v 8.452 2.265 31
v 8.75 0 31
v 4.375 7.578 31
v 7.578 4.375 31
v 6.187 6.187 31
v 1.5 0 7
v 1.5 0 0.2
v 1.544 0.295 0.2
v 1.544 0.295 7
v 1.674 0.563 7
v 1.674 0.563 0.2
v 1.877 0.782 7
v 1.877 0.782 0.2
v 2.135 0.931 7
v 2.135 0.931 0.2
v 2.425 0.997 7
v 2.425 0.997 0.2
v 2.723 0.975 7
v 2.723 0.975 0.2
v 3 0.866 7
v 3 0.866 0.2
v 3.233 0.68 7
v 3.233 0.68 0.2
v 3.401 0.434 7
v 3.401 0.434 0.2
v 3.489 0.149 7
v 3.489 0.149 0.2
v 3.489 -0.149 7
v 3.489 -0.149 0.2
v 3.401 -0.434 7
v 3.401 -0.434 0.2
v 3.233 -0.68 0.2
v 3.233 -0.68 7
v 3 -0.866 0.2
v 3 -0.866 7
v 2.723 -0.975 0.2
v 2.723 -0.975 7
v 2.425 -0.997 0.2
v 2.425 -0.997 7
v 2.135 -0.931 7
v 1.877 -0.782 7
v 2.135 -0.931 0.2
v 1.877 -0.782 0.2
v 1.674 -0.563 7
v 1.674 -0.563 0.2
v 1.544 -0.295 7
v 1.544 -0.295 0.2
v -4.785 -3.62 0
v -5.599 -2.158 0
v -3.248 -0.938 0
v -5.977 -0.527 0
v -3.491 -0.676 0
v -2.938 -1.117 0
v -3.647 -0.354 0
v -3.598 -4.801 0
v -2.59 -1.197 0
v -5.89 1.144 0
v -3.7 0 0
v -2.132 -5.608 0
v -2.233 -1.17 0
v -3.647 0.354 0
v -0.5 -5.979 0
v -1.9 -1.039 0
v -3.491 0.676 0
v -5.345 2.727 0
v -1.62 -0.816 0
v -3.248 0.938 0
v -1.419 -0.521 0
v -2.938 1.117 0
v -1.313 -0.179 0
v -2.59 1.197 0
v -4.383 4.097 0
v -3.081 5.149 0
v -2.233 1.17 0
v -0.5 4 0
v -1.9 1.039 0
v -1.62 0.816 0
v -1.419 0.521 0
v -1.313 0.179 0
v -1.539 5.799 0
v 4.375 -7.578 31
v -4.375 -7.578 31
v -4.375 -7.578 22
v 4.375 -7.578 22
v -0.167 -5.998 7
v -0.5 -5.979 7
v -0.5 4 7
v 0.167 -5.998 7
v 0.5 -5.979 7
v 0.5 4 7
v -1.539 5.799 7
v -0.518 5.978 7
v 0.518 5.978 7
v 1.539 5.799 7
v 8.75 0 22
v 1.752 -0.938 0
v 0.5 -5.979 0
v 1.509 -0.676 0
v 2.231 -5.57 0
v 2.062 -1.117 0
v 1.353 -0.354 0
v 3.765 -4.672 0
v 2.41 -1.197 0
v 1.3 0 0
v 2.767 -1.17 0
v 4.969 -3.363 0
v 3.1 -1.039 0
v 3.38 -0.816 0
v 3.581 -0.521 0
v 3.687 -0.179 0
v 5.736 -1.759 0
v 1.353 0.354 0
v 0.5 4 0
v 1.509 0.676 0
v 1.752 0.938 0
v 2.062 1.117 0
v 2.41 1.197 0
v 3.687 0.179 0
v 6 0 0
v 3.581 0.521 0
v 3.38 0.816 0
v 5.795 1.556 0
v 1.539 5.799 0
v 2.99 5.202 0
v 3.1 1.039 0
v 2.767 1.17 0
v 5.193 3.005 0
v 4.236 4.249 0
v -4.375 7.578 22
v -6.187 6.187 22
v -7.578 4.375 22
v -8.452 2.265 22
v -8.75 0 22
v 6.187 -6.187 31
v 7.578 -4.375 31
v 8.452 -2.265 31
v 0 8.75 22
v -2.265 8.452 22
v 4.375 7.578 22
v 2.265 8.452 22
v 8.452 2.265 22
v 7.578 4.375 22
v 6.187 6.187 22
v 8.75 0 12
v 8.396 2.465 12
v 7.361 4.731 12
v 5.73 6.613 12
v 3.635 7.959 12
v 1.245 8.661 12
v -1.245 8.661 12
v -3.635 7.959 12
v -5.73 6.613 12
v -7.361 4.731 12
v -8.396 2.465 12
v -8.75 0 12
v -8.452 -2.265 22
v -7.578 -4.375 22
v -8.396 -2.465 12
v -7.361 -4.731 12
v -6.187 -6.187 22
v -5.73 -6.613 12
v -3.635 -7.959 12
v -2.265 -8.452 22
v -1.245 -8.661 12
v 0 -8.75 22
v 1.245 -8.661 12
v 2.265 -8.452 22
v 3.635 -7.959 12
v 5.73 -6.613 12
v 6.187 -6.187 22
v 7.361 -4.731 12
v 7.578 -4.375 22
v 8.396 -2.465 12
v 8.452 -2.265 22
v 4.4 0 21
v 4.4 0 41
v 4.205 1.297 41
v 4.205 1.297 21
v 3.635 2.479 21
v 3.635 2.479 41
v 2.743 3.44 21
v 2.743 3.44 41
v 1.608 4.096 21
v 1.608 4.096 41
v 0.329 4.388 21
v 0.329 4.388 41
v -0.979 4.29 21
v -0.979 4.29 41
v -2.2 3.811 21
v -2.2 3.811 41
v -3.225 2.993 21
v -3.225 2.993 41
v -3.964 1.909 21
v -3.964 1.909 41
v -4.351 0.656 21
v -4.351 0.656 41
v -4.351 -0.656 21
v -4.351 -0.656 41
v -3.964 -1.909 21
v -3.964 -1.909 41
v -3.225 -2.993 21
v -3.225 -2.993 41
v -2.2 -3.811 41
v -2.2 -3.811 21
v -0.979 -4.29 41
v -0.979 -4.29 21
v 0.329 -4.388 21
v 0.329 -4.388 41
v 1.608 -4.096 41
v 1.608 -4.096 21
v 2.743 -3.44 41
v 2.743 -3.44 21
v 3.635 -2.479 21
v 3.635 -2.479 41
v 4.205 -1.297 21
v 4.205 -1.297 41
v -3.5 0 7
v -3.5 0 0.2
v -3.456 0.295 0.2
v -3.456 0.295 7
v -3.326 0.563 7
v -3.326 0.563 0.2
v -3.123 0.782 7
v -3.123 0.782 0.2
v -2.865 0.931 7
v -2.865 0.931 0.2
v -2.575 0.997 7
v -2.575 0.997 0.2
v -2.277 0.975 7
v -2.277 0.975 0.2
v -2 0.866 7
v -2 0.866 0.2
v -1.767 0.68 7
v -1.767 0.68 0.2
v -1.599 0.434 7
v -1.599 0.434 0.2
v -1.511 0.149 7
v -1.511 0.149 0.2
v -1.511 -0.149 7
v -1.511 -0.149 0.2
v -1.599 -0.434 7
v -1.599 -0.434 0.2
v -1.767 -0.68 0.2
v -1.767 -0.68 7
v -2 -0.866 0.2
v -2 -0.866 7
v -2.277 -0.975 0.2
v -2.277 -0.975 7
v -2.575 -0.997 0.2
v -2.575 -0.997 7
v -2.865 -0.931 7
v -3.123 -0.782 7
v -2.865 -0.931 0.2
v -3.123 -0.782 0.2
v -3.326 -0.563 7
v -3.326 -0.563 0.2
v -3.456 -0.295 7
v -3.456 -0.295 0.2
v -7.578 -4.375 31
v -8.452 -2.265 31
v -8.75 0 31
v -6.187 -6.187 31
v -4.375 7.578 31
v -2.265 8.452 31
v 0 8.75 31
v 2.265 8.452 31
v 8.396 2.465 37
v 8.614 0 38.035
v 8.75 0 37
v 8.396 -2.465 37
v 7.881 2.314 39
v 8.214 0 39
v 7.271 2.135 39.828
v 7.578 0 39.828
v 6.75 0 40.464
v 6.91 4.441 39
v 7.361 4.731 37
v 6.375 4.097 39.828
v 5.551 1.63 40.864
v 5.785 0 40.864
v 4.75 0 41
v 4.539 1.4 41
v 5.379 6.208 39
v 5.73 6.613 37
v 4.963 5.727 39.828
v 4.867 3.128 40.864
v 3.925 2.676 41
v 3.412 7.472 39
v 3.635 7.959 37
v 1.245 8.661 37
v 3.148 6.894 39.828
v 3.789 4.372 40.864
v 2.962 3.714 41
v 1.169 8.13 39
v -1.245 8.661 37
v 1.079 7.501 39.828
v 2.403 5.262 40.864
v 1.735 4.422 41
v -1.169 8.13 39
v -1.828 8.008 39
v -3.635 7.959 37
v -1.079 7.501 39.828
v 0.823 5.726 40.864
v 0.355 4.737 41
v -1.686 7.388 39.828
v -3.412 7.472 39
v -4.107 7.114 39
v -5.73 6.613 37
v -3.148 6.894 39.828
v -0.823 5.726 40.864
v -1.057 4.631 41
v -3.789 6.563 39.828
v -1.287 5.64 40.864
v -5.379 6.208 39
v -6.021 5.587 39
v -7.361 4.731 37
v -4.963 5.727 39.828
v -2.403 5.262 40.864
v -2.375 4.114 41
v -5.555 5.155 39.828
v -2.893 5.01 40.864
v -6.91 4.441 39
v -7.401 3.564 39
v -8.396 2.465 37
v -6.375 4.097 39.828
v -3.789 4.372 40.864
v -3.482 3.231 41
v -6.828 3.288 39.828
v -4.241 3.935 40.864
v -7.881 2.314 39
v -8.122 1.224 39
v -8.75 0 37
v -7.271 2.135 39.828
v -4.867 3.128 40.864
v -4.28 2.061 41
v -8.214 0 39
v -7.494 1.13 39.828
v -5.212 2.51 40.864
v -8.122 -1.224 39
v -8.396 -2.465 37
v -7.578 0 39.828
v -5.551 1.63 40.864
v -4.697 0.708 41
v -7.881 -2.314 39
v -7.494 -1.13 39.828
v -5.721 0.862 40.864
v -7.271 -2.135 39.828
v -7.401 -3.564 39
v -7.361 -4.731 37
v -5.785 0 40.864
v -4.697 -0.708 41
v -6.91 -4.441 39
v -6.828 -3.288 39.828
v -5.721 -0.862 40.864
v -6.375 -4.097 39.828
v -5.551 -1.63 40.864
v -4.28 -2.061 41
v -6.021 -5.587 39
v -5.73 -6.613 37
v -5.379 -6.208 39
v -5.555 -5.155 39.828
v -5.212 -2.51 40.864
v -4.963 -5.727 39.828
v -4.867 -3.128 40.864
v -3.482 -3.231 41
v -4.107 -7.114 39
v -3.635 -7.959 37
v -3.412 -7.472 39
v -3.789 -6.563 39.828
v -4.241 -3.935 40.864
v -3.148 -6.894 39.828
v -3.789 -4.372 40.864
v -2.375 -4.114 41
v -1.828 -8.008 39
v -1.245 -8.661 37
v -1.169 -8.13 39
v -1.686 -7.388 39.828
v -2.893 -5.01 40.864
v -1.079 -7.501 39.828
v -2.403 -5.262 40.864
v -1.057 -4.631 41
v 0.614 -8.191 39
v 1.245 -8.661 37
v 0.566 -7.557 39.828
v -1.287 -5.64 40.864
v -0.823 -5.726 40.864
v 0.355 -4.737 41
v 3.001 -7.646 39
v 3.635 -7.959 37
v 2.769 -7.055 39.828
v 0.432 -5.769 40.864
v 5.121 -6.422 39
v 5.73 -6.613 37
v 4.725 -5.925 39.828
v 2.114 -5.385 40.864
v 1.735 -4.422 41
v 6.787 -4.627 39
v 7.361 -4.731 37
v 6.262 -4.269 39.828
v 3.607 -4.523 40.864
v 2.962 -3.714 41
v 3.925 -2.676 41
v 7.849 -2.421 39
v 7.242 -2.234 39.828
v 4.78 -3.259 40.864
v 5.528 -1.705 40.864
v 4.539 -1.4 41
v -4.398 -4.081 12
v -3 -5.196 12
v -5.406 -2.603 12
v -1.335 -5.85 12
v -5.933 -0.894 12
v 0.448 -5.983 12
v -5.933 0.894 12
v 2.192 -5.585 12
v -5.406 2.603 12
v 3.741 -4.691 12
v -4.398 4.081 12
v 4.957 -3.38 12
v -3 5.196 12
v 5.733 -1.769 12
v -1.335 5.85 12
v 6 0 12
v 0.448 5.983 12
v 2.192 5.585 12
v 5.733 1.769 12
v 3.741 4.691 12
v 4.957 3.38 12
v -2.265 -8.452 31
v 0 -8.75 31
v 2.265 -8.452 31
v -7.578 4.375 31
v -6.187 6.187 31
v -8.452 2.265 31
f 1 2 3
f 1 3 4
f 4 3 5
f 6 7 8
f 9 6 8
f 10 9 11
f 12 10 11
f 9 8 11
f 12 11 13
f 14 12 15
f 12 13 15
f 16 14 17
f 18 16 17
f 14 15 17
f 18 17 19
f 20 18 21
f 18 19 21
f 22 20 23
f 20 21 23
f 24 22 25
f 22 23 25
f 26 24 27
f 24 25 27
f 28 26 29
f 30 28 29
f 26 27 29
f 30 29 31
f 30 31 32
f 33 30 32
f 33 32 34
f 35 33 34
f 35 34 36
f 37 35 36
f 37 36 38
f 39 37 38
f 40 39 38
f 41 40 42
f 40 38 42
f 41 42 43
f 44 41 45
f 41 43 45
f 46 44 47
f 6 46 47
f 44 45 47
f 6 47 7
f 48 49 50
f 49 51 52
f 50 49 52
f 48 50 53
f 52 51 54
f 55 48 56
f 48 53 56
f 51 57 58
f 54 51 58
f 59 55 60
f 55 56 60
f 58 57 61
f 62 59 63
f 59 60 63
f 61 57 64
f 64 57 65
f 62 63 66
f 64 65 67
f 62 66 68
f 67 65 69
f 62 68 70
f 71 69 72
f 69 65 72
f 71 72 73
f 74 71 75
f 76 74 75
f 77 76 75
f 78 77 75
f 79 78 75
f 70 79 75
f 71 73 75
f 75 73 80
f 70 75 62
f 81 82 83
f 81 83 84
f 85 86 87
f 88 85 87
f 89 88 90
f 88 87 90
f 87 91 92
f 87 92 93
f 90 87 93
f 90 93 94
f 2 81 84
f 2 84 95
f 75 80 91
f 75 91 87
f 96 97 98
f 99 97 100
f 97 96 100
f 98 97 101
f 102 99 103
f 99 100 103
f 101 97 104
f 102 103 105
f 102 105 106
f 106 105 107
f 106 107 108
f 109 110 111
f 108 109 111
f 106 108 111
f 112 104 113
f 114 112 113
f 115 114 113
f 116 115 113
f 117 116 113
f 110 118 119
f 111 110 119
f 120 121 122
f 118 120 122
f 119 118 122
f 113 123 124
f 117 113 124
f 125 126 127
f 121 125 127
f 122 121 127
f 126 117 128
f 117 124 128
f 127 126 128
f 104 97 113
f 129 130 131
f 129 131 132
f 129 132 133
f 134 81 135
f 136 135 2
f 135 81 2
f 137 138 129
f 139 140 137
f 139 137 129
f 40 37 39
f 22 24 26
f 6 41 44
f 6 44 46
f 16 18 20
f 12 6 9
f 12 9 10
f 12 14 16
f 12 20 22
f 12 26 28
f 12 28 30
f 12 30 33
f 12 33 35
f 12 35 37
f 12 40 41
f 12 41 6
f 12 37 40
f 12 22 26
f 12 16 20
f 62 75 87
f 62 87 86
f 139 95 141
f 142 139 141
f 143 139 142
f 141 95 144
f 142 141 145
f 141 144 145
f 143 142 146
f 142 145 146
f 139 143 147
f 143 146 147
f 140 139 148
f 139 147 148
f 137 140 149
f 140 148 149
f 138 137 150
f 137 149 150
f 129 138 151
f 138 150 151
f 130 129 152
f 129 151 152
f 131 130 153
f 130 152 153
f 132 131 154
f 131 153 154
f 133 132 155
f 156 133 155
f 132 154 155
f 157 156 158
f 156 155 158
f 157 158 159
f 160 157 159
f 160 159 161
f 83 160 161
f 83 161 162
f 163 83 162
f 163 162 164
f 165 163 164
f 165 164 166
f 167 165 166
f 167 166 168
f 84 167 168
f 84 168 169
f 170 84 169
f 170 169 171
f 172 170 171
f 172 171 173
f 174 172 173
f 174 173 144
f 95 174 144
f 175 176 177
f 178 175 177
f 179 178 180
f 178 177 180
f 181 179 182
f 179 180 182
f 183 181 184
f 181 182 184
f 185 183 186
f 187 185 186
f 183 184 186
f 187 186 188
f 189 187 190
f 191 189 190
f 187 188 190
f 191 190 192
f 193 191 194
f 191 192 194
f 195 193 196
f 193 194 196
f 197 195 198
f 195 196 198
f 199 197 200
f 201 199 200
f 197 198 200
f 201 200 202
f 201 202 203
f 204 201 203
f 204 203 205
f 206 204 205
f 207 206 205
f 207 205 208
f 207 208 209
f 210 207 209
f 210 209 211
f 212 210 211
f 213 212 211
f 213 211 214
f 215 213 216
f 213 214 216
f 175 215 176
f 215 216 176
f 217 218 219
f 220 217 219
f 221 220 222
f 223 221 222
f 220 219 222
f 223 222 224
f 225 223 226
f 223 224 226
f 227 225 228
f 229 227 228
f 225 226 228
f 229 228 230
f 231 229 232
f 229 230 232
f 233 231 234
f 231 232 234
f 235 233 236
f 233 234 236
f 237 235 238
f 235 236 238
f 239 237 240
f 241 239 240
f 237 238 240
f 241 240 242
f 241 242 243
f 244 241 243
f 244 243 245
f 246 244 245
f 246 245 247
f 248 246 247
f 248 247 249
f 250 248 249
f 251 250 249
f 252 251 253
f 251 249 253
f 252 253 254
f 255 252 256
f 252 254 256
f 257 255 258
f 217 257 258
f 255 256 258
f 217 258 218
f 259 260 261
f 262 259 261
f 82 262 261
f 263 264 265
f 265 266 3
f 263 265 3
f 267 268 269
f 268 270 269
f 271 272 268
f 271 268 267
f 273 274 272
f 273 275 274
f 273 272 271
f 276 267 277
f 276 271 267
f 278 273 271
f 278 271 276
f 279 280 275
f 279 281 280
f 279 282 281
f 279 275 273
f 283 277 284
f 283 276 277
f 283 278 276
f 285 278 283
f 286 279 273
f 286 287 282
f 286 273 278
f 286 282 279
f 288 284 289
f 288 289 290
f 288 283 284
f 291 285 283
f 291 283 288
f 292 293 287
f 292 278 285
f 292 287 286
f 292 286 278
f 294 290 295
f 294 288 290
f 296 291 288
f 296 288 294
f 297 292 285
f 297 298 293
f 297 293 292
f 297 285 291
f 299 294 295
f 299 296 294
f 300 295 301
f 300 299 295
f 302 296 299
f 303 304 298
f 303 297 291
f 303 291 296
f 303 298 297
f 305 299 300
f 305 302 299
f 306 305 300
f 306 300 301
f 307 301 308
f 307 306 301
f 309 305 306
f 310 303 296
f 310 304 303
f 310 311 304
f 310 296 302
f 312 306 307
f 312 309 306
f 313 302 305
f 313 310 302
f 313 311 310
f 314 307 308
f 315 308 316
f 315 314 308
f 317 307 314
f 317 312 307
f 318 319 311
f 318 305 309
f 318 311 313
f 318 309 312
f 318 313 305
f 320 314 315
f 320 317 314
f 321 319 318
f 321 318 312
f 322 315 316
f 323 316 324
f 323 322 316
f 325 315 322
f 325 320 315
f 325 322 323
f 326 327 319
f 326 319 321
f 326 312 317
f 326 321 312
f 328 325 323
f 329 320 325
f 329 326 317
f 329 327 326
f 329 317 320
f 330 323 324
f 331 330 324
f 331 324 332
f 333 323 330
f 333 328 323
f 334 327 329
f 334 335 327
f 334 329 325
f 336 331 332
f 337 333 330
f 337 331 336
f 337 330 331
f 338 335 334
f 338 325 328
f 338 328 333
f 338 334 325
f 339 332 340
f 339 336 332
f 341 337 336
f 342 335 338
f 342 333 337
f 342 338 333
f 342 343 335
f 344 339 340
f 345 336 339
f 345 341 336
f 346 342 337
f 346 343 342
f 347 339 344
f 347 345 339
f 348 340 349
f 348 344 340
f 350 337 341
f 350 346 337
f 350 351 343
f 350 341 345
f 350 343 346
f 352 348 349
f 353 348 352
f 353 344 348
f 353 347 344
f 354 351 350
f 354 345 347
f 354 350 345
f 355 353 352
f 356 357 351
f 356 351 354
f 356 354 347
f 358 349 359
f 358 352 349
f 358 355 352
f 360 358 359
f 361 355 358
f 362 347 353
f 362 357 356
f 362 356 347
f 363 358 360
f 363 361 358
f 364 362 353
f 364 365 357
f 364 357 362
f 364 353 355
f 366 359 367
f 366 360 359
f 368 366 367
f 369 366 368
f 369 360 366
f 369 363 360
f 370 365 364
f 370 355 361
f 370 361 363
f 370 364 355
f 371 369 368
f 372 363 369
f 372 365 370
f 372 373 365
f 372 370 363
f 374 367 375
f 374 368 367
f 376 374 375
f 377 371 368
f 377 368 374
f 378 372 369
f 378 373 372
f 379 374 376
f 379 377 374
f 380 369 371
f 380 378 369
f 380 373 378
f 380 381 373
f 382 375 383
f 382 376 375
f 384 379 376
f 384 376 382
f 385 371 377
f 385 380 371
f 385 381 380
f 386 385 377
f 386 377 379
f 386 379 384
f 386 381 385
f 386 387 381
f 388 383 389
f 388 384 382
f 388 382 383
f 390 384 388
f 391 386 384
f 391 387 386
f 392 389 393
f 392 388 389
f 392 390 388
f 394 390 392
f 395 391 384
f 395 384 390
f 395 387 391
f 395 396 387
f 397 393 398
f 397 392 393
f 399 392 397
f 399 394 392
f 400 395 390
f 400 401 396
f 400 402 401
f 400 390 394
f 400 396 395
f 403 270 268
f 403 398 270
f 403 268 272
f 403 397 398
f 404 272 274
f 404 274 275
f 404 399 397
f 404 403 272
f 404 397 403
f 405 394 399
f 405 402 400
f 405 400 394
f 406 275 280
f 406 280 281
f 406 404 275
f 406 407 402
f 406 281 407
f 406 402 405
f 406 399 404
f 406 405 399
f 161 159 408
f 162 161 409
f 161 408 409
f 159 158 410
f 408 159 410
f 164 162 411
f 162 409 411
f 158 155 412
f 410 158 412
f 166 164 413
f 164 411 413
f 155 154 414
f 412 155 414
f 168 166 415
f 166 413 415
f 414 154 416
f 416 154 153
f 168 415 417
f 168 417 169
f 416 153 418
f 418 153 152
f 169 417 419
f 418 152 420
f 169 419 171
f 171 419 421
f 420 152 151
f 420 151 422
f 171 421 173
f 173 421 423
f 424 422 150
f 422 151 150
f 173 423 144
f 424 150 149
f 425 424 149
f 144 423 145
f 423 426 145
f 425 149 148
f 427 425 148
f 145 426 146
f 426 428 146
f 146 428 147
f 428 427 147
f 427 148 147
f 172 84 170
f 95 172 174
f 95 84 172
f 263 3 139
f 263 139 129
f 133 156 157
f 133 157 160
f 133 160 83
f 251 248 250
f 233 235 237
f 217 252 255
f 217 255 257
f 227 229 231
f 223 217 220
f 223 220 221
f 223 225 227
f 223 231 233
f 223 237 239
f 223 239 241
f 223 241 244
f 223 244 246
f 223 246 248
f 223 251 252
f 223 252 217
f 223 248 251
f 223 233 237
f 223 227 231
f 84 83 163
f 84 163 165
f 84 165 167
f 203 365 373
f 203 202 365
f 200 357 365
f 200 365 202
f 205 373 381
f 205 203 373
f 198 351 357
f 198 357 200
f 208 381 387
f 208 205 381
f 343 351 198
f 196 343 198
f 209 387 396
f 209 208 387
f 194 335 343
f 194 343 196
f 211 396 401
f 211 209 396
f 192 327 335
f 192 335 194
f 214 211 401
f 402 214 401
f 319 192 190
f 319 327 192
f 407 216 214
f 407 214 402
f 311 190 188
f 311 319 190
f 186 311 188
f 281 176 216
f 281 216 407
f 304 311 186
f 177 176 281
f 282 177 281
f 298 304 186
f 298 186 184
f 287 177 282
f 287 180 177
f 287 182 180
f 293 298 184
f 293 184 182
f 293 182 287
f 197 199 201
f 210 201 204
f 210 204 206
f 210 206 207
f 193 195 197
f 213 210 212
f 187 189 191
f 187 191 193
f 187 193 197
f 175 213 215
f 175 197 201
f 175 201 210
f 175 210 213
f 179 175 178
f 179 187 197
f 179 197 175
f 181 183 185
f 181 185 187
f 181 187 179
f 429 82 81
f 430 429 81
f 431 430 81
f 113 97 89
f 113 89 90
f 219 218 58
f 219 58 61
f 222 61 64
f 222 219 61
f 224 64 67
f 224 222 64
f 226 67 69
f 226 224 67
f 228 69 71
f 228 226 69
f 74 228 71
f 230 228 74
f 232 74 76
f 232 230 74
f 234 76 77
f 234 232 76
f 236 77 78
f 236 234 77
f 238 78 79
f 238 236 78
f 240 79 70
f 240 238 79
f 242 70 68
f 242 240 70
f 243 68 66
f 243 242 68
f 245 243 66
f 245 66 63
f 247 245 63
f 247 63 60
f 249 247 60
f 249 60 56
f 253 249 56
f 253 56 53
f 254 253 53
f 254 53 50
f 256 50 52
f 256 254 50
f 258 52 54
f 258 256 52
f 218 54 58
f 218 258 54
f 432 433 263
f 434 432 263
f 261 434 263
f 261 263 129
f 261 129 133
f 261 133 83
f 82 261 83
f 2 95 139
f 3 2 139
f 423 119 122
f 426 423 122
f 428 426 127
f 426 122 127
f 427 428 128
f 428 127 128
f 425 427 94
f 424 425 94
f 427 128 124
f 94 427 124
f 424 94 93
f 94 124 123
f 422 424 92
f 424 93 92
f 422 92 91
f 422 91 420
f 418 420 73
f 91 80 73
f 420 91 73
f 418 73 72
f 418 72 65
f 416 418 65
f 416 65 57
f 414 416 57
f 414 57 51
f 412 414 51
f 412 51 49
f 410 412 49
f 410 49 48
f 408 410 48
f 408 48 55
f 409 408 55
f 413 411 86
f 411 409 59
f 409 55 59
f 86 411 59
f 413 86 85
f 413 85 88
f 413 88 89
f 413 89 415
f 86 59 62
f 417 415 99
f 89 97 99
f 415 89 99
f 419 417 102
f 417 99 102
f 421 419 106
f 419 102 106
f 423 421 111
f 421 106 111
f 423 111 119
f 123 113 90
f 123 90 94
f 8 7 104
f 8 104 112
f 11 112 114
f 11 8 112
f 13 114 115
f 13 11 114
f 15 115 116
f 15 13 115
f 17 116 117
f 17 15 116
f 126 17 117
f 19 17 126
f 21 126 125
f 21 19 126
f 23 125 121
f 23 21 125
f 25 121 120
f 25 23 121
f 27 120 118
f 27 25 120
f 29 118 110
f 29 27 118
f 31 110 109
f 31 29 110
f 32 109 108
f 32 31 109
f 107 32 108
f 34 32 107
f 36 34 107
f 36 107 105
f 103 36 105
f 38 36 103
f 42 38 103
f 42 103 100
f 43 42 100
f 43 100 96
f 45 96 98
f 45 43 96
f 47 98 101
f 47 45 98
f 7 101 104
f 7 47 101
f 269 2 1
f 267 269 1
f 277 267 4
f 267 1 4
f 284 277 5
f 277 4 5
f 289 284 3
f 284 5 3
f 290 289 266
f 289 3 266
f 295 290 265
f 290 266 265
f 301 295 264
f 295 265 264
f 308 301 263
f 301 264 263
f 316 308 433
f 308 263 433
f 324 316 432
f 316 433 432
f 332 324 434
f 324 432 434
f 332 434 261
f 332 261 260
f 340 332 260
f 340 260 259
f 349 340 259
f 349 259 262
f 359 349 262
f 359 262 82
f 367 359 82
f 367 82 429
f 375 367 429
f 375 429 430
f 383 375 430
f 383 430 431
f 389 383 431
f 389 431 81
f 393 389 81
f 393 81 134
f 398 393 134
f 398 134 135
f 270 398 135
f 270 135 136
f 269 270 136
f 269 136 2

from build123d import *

# Parameters (mm, degrees)
SKETCH1_R           = 6
BOSS_EXTRUDE1_DEPTH = 12
SKETCH2_R           = 8.75
BOSS_EXTRUDE2_DEPTH = 10
BOSS_EXTRUDE3_DEPTH = 9
SKETCH4_R           = 8.75
BOSS_EXTRUDE4_DEPTH = 10
FILLET1_R           = 4
SKETCH5_R           = 4.4
CUT_EXTRUDE1_DEPTH  = 20
CUT_EXTRUDE2_DEPTH  = 7
SKETCH7_R           = 1
CUT_EXTRUDE3_DEPTH  = 7
CHAMFER1_SIZE       = 0.2


with BuildPart() as part:
    # Sketch1 → Boss-Extrude1 (new body)
    with BuildSketch(Plane.XY):
        Circle(SKETCH1_R)
    extrude(amount=BOSS_EXTRUDE1_DEPTH)

    # Sketch2 → Boss-Extrude2 (add)
    with BuildSketch(Plane.XY.offset(12)):
        Circle(SKETCH2_R)
    extrude(amount=BOSS_EXTRUDE2_DEPTH)

    # Sketch3 → Boss-Extrude3 (add)
    with BuildSketch(Plane.XY.offset(22)):
        Polygon((4.375, 7.577722283), (-4.375, 7.577722283), (-8.75, 0), (-4.375, -7.577722283), (4.375, -7.577722283), (8.75, 0), align=None)
    extrude(amount=BOSS_EXTRUDE3_DEPTH)

    # Sketch4 → Boss-Extrude4 (add)
    with BuildSketch(Plane.XY.offset(31)):
        Circle(SKETCH4_R)
    extrude(amount=BOSS_EXTRUDE4_DEPTH)

    # Fillet1
    fillet1_edges = [part.edges().sort_by_distance(p)[0] for p in [
        (-8.75, 0, 41),
    ]]
    fillet(fillet1_edges, radius=FILLET1_R)

    # Sketch5 → Cut-Extrude1 (cut)
    with BuildSketch(Plane.XY.offset(41)):
        Circle(SKETCH5_R)
    extrude(amount=-CUT_EXTRUDE1_DEPTH, mode=Mode.SUBTRACT)

    # Sketch6 → Cut-Extrude2 (cut)
    with BuildSketch(Plane(origin=(0, 0, 0), x_dir=(-1, 0, 0), z_dir=(0, 0, -1))):
        with BuildLine():
            Line((-0.5, -5.979130372), (-0.5, 4))
            Line((-0.5, 4), (-1.538832081, 5.799309944))
            ThreePointArc((-1.538832081, 5.799309944), (0, 6), (1.538832081, 5.799309944))
            Line((1.538832081, 5.799309944), (0.5, 4))
            Line((0.5, 4), (0.5, -5.979130372))
            ThreePointArc((0.5, -5.979130372), (0, -6), (-0.5, -5.979130372))
        make_face()
    extrude(amount=-CUT_EXTRUDE2_DEPTH, mode=Mode.SUBTRACT)

    # Sketch7 → Cut-Extrude3 (cut)
    with BuildSketch(Plane(origin=(0, 0, 0), x_dir=(-1, 0, 0), z_dir=(0, 0, -1))):
        with Locations((-2.5, 0)):
            Circle(SKETCH7_R)
        with Locations((2.5, 0)):
            Circle(SKETCH7_R)
    extrude(amount=-CUT_EXTRUDE3_DEPTH, mode=Mode.SUBTRACT)

    # Chamfer1
    chamfer1_edges = [part.edges().sort_by_distance(p)[0] for p in [
        (3.5, 0, 0),
        (-1.5, 0, 0),
    ]]
    chamfer(chamfer1_edges, length=CHAMFER1_SIZE)


solid = part.part
